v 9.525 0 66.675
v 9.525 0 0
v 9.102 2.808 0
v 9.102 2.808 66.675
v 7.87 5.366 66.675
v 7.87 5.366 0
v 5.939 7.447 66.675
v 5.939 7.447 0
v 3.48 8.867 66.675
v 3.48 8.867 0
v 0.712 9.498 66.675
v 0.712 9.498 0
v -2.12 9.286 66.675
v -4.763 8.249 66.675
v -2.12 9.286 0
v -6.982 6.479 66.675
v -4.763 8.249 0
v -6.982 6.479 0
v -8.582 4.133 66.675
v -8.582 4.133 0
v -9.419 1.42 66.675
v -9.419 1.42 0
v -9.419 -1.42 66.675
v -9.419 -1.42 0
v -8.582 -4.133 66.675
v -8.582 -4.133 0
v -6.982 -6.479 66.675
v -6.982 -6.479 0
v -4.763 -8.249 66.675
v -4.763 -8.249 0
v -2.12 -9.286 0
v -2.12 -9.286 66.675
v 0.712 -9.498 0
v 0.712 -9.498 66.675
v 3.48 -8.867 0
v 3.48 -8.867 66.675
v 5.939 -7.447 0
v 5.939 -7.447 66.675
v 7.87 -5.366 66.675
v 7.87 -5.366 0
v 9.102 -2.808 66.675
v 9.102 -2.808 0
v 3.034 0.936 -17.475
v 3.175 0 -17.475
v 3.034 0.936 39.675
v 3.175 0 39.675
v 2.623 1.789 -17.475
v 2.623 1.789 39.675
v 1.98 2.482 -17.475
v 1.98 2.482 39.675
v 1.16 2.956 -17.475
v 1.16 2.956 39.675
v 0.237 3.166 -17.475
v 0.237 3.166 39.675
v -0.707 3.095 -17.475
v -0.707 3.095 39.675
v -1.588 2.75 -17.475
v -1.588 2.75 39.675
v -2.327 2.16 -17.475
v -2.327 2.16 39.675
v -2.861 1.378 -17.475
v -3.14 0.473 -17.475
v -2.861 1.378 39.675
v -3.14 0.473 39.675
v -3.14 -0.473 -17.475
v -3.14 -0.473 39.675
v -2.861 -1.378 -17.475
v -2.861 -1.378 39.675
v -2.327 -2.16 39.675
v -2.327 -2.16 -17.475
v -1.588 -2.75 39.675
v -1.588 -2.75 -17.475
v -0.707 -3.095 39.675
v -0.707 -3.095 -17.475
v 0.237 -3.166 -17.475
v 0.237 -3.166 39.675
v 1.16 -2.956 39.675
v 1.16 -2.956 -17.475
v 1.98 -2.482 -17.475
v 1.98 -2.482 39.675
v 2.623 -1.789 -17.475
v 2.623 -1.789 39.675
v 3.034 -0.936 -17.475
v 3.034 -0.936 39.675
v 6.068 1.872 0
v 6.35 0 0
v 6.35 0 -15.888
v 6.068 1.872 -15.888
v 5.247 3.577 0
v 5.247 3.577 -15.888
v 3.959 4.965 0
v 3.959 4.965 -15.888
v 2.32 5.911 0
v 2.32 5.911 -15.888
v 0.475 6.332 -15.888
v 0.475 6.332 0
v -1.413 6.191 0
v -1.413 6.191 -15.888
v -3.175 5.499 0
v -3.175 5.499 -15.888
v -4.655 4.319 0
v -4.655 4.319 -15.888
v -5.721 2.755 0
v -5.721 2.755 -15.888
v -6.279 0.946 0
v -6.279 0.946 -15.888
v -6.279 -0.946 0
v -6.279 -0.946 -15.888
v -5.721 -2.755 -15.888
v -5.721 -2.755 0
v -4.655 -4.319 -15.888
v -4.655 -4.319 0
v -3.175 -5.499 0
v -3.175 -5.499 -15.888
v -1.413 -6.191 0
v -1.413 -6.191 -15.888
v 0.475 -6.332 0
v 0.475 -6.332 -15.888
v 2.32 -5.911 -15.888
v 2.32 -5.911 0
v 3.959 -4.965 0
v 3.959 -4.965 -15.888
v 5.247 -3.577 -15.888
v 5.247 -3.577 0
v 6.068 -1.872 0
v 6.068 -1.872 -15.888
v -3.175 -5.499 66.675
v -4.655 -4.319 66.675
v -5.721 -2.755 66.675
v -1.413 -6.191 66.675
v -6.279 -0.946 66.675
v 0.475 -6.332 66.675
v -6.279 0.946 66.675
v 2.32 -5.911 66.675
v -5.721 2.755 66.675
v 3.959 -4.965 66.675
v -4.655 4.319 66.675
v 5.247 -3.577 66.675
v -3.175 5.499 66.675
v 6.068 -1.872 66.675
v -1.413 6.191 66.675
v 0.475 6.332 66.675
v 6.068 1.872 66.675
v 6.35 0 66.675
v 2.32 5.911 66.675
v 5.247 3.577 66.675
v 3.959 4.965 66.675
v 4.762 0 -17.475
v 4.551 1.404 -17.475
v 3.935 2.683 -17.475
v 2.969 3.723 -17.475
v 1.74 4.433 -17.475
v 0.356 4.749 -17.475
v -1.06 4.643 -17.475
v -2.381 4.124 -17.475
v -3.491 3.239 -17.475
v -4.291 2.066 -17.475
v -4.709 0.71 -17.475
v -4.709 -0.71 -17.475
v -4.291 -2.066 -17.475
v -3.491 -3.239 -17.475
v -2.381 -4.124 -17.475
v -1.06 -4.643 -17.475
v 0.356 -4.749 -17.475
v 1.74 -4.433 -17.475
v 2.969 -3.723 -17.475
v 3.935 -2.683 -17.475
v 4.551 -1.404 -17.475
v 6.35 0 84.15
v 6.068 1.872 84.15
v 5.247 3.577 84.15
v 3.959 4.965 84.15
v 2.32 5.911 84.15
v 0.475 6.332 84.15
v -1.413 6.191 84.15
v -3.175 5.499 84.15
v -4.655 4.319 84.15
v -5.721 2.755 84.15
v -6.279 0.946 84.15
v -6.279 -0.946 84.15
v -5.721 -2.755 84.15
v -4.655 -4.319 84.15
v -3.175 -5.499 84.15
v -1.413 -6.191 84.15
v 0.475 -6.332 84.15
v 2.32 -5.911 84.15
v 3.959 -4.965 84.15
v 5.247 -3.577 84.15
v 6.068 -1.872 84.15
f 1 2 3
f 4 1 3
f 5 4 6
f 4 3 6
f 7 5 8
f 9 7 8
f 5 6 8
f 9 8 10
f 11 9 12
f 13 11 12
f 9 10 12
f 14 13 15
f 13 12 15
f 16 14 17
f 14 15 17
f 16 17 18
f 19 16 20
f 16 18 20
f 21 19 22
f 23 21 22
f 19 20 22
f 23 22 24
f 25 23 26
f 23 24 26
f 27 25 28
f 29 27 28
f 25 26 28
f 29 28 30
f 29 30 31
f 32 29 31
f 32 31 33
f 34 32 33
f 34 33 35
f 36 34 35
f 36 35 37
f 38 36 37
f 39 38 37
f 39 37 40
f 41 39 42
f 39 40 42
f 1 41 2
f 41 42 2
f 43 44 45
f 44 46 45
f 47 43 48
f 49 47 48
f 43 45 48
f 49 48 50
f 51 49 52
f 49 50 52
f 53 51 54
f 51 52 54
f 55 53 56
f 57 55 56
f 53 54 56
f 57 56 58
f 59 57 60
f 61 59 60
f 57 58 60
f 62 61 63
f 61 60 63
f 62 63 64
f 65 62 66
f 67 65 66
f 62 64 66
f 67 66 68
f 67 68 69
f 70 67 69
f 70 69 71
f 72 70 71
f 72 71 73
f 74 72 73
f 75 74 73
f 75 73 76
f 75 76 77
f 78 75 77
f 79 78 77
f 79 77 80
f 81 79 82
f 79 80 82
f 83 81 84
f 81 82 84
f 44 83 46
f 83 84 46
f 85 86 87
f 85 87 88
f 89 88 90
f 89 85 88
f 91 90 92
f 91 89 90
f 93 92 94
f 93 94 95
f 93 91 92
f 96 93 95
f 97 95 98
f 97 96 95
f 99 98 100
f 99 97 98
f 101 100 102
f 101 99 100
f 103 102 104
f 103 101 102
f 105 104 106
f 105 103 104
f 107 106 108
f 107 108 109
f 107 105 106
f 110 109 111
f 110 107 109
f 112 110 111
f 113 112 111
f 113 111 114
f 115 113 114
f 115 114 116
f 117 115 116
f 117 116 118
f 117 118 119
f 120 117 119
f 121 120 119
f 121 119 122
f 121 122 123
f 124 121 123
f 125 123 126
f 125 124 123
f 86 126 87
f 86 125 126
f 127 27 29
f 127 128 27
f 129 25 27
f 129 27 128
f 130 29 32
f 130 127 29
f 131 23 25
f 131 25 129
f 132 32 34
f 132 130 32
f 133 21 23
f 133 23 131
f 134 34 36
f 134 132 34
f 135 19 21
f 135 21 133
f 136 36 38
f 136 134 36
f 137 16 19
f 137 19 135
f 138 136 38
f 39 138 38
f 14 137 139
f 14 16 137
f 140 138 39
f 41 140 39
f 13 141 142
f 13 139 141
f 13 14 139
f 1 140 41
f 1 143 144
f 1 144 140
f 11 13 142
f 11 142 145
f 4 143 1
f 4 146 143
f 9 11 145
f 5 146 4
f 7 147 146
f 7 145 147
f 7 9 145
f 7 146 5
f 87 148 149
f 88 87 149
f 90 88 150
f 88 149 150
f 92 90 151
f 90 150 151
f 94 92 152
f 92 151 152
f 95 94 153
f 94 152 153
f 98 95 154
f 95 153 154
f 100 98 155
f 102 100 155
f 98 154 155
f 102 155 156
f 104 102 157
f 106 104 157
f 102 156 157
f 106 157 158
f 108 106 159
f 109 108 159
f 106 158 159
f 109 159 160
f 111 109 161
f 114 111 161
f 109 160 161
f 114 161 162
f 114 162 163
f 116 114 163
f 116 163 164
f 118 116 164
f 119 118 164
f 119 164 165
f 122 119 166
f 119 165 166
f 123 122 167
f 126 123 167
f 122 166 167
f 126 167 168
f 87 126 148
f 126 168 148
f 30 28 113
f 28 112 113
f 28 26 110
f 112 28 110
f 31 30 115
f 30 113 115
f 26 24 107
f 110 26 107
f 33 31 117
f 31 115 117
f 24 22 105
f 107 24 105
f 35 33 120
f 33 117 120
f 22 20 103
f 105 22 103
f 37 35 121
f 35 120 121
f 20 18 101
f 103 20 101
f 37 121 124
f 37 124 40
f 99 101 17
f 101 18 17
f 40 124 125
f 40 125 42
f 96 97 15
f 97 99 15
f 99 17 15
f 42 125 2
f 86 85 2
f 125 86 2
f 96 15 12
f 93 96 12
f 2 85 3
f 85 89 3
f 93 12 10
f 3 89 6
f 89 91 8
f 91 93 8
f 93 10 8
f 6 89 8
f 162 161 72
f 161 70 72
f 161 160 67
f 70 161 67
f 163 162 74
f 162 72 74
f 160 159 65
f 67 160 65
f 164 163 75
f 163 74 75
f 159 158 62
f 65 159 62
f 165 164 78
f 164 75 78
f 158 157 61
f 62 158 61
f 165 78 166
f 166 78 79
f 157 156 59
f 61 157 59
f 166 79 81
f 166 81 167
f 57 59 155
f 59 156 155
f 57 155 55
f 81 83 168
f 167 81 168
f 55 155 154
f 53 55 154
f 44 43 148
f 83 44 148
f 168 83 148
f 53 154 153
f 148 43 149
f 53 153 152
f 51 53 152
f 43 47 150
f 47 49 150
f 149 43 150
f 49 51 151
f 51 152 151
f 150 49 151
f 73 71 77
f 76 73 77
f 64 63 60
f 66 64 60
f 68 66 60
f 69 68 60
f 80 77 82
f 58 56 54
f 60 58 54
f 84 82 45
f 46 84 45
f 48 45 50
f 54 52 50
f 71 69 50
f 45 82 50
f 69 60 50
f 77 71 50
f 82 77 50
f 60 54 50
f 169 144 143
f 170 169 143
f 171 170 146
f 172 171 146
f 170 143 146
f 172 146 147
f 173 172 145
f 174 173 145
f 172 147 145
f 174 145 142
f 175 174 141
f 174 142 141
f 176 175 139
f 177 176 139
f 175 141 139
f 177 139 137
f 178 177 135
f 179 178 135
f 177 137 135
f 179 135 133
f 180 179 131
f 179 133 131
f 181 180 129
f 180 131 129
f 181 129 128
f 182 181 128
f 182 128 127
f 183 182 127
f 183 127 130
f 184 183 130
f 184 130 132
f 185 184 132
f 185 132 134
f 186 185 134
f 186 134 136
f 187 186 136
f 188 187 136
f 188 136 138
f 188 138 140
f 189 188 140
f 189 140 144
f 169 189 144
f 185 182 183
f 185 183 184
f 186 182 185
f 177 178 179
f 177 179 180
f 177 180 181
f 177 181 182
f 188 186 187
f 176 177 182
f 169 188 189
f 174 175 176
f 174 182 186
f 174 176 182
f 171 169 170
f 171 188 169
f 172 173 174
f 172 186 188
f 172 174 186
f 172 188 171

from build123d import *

# Parameters (mm, degrees)
F0_R     = 9.525
F0_R_2   = 6.35
F1_DEPTH = 66.675
F0_R_3   = 3.175
F2_DEPTH = 84.1502
F3_DEPTH = 17.4752
F4_SIZE  = 1.5875
F5_R     = 3.175
F6_DEPTH = 44.4754


with BuildPart() as f1:
    # F0 (on Top) → F1 (new body)
    with BuildSketch(Plane.XY):
        Circle(F0_R)
        Circle(F0_R_2, mode=Mode.SUBTRACT)
    extrude(amount=F1_DEPTH)

    # F0 (on Top) → F2 (join)
    with BuildSketch(Plane.XY):
        Circle(F0_R_2)
        Circle(F0_R_3, mode=Mode.SUBTRACT)
    extrude(amount=F2_DEPTH)

    # F0 (on Top) → F3 (join)
    with BuildSketch(Plane.XY):
        Circle(F0_R_2)
        Circle(F0_R_3, mode=Mode.SUBTRACT)
    extrude(amount=-F3_DEPTH)

    # F4
    f4_edges = [f1.edges().sort_by_distance(p)[0] for p in [
        (-6.35, 0, -17.4752),
    ]]
    chamfer(f4_edges, length=F4_SIZE)

    # F5 (on face) → F6 (join)
    with BuildSketch(Plane.XY.offset(84.1502)):
        Circle(F5_R)
    extrude(amount=-F6_DEPTH)


solid = f1.part
